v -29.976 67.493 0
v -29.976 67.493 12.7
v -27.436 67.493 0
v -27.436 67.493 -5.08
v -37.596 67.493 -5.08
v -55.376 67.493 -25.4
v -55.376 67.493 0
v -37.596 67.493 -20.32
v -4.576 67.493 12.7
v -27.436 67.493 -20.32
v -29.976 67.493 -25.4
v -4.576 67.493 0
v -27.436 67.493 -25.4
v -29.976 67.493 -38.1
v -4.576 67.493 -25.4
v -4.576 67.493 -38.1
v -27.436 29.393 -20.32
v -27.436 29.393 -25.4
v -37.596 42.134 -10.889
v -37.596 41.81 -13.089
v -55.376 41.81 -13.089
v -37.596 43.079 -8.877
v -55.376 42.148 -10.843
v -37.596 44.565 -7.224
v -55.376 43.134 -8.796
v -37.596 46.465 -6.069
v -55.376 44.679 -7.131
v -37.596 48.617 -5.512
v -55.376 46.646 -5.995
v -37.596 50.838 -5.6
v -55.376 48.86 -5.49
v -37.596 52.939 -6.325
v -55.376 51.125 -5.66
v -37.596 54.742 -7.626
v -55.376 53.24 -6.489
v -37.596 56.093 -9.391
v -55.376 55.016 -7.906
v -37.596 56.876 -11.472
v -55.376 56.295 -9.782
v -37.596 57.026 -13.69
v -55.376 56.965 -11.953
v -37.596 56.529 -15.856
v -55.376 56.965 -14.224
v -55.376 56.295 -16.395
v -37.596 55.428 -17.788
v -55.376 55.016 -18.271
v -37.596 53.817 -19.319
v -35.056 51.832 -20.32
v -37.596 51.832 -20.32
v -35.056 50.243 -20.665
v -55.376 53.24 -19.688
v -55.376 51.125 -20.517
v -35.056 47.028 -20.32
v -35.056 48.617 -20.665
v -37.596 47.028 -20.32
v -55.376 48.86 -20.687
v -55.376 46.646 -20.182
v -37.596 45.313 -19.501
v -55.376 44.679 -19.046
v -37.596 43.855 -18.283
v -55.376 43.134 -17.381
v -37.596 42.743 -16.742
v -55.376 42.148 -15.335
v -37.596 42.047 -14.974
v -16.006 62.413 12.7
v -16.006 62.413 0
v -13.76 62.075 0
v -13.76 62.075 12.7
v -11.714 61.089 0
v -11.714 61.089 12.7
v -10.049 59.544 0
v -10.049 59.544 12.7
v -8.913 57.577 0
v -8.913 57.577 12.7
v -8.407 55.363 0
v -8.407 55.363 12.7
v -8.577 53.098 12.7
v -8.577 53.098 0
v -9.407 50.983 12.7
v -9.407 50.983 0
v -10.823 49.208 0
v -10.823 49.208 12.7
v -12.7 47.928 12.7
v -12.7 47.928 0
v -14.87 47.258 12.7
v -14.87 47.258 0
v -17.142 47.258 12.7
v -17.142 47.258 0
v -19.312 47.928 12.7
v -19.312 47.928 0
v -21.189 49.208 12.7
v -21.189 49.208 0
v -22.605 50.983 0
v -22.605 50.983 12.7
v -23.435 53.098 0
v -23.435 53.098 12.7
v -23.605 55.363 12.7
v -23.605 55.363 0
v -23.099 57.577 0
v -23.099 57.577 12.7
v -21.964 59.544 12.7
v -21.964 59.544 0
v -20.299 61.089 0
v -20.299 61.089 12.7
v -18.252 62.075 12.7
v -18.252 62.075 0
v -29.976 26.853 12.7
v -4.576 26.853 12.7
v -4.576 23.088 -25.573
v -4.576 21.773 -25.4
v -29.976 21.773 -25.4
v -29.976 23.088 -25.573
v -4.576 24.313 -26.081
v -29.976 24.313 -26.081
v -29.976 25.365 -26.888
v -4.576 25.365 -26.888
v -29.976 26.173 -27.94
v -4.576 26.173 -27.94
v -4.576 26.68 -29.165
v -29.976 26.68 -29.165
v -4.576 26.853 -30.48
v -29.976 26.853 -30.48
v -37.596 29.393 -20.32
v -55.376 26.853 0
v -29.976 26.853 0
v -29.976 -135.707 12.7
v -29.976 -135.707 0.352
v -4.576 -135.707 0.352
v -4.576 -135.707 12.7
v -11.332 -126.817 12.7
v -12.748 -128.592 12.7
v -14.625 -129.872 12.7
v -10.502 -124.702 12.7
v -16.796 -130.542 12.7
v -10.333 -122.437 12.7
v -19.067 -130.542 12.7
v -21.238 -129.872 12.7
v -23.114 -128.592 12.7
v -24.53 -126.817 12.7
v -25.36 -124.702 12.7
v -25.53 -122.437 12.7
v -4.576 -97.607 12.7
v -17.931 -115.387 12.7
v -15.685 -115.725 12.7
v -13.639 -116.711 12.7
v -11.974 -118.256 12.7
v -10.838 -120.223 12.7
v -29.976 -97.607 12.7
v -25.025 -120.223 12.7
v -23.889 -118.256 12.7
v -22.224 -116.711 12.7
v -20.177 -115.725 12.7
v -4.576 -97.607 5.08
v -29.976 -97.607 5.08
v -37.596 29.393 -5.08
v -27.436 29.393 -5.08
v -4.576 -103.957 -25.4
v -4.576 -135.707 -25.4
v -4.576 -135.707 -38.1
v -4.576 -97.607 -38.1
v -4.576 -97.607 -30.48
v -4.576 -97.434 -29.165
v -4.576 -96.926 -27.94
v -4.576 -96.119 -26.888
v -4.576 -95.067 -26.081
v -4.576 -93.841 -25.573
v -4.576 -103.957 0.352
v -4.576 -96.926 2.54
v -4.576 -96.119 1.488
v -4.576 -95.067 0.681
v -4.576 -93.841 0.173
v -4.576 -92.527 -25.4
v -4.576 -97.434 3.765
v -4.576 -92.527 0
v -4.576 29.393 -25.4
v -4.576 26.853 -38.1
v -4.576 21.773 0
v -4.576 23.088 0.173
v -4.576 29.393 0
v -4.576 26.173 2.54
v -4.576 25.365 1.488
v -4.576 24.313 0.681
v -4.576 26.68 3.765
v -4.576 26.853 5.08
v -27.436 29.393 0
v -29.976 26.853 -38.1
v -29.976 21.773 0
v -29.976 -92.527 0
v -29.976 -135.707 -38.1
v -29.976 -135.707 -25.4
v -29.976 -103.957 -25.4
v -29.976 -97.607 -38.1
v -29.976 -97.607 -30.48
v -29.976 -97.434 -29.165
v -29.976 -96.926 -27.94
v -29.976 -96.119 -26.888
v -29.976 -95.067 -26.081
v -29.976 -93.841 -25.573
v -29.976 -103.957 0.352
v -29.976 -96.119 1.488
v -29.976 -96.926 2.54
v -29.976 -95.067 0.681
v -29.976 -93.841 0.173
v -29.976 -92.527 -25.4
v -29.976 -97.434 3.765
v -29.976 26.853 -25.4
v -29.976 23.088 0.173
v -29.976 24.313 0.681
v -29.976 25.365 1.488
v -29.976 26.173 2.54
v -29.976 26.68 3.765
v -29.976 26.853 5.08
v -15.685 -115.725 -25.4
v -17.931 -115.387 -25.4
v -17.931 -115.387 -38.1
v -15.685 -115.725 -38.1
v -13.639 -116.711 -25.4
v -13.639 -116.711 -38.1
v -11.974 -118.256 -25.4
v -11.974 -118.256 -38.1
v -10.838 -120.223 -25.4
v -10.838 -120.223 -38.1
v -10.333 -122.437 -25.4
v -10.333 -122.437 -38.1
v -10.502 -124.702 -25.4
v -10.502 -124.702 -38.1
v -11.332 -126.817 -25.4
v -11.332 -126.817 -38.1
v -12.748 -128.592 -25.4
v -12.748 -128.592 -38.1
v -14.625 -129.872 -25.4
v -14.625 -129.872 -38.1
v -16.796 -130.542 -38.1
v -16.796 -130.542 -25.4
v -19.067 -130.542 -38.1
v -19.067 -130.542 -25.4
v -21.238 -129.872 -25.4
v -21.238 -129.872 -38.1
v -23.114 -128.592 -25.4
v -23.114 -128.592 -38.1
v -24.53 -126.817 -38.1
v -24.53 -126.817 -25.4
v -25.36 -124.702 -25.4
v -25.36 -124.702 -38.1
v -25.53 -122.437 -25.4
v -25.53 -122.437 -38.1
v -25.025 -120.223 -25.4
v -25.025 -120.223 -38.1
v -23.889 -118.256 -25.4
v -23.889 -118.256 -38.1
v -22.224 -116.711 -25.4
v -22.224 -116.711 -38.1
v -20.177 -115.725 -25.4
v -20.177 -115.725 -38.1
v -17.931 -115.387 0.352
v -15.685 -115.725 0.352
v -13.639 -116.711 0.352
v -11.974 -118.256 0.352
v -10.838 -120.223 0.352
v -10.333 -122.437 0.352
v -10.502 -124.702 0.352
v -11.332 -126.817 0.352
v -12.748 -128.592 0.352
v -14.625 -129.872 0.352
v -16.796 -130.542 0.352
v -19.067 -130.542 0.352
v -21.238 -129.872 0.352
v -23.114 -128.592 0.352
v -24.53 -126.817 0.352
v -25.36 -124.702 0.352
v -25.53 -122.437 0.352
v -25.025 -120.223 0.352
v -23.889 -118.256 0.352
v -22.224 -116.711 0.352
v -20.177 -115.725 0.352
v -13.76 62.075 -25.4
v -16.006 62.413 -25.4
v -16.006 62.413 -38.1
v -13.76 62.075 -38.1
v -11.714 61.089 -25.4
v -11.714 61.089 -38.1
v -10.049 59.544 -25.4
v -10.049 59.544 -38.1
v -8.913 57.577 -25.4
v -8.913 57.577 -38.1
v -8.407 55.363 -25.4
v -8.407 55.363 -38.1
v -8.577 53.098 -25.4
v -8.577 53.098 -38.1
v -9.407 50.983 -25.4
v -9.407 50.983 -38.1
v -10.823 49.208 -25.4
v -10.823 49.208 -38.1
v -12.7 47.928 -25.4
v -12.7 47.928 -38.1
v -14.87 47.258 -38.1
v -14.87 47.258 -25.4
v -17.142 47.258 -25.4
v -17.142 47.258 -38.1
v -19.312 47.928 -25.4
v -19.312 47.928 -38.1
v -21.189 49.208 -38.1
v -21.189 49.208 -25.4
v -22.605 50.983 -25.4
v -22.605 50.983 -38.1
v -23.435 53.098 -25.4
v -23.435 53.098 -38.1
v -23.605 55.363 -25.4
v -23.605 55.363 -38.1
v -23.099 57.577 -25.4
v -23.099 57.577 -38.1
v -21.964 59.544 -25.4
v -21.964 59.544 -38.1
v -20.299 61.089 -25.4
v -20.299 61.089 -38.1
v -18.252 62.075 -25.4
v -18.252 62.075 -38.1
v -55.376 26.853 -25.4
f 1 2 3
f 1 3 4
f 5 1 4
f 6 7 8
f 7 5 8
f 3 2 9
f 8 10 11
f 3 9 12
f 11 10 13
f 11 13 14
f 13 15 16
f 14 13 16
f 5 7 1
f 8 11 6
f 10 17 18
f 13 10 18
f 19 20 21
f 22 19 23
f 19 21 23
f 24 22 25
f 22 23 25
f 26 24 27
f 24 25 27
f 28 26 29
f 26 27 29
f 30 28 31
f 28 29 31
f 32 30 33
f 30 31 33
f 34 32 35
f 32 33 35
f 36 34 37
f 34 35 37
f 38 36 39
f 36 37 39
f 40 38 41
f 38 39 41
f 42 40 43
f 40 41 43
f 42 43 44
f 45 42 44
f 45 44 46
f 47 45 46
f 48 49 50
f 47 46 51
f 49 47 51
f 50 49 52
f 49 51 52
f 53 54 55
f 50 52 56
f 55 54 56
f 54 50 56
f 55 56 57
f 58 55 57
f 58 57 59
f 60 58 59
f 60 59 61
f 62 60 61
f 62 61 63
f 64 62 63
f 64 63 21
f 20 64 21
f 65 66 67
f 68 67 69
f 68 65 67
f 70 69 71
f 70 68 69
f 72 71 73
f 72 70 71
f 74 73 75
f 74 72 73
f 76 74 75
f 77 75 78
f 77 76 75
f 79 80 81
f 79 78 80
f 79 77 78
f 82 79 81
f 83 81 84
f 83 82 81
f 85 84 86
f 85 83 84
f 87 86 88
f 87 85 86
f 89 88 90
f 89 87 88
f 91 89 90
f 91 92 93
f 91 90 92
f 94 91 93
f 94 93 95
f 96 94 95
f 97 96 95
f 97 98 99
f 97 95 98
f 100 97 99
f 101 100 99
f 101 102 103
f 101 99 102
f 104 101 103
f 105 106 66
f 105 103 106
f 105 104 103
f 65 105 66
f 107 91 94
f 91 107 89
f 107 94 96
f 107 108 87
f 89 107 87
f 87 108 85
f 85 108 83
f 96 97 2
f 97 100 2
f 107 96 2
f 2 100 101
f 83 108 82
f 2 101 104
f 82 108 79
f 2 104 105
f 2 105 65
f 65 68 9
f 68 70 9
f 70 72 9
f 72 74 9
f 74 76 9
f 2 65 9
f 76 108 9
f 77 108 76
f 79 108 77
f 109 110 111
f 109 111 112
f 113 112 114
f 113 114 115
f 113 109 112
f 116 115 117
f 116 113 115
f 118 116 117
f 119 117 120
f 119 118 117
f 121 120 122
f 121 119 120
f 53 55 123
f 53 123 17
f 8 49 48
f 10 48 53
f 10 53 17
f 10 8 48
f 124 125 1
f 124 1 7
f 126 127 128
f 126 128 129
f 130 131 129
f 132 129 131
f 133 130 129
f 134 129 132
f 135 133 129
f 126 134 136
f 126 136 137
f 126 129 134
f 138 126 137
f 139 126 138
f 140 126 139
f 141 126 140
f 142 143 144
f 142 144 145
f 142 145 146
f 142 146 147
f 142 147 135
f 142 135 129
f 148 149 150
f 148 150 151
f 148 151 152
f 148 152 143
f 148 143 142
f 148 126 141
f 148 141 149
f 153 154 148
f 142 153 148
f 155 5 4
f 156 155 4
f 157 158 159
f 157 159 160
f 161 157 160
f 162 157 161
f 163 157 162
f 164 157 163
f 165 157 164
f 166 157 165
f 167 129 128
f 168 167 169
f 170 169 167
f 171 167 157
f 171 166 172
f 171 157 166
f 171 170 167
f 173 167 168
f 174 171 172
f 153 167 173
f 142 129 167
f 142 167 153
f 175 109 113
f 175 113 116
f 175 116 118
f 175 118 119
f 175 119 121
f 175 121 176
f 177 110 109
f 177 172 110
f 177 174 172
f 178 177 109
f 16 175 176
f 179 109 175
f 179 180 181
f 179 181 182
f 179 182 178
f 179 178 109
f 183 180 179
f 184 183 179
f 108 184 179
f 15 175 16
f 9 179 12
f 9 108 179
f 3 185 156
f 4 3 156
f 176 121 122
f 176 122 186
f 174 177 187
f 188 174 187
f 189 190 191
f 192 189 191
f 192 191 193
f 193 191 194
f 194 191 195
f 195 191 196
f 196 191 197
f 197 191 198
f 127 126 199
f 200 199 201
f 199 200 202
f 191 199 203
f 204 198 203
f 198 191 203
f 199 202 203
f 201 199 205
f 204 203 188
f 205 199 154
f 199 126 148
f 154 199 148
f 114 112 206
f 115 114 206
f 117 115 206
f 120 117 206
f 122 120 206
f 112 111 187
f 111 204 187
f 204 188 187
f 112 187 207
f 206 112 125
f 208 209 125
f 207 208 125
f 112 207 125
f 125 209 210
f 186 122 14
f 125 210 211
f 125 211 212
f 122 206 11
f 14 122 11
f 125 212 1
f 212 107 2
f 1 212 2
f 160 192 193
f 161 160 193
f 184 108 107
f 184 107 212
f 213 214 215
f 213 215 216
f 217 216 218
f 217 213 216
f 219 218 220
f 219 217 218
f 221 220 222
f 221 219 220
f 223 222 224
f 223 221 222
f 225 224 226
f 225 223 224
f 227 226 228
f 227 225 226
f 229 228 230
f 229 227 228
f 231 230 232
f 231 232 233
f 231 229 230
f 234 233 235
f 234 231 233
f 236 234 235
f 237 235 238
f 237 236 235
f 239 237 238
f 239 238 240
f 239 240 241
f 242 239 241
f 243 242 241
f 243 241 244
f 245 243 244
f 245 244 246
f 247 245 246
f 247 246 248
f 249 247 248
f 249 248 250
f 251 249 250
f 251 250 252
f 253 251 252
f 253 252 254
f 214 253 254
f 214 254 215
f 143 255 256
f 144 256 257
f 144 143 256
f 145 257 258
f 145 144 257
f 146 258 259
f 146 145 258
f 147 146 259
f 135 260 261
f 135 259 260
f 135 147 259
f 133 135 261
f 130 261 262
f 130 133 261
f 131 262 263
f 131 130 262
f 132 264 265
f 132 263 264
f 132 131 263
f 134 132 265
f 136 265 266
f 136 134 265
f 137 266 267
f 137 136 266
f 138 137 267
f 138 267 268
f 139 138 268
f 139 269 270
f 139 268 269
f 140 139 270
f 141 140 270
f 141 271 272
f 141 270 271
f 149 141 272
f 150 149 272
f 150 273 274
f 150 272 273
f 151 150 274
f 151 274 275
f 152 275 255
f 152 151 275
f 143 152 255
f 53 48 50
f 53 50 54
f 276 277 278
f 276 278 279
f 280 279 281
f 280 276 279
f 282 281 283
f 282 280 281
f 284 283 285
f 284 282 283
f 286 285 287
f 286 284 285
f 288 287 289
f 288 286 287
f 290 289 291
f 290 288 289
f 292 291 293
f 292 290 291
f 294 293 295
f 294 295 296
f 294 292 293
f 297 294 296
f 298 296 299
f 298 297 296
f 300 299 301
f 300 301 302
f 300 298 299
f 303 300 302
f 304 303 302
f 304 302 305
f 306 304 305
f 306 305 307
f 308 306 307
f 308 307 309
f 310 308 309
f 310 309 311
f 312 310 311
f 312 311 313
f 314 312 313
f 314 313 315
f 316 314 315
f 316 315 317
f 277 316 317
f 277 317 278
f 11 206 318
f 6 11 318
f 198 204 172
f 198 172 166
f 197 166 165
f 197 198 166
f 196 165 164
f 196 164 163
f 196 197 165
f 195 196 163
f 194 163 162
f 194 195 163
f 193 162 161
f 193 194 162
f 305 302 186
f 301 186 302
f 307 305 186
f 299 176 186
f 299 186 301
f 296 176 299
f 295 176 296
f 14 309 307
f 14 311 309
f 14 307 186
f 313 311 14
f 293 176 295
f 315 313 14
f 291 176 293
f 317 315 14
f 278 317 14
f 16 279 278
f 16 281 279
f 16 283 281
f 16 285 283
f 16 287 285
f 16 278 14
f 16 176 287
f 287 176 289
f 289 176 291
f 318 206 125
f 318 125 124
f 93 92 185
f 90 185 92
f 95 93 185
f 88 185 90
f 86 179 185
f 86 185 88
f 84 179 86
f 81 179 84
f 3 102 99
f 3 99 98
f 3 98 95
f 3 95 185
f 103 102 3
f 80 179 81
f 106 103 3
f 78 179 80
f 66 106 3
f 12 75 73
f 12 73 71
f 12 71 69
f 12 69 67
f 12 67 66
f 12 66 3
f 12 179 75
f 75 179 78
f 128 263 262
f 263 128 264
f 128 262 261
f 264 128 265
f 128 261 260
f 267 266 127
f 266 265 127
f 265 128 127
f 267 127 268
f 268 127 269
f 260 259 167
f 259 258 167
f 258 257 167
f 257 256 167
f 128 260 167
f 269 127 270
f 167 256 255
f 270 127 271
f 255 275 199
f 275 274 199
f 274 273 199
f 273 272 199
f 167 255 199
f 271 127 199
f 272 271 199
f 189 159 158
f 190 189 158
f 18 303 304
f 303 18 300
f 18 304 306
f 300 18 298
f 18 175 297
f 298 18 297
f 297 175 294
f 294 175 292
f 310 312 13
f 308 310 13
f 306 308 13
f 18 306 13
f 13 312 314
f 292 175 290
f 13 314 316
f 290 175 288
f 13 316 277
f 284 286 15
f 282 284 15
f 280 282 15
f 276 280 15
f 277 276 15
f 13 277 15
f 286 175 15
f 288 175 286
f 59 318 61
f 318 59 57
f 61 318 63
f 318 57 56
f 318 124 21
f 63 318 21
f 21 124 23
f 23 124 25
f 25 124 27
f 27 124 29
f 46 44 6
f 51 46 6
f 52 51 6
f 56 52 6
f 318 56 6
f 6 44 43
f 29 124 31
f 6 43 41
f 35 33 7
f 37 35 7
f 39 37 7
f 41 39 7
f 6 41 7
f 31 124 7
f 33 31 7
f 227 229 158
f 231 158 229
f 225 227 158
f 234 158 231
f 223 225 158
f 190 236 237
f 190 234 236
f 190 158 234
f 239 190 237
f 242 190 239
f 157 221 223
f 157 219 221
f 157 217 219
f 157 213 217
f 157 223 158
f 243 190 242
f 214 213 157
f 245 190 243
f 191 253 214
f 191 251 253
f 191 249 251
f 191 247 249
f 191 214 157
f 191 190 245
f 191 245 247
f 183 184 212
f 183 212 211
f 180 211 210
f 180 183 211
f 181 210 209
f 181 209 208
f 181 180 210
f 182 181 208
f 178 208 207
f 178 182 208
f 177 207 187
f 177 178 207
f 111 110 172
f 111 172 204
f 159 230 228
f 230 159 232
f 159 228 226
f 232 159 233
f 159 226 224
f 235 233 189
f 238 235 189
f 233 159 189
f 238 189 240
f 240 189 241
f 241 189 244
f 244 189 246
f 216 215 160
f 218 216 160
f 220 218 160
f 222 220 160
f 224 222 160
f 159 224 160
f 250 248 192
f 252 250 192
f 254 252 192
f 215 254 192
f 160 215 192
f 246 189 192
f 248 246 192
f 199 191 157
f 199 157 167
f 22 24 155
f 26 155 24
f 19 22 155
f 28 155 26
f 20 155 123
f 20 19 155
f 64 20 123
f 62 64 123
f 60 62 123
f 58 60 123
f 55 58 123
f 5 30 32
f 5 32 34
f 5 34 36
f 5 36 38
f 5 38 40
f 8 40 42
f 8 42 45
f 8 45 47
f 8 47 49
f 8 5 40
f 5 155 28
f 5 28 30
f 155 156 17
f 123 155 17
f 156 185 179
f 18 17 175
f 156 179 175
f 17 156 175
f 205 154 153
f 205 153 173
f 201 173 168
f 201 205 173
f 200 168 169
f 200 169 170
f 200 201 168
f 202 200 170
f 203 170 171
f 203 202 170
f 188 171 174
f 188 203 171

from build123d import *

# Parameters (mm, degrees)
BASE_EXTRUDE_DEPTH  = 25.4
SKETCH7_W           = 12.7
SKETCH7_H           = 38.1
BOSS_EXTRUDE5_DEPTH = 25.4
SKETCH8_W           = 25.751736715
SKETCH8_H           = 31.75
CUT_EXTRUDE5_DEPTH  = 25.4
SKETCH11_W          = 12.7
SKETCH11_H          = 40.64
BOSS_EXTRUDE6_DEPTH = 25.4
SKETCH12_W          = 25.4
SKETCH12_H          = 38.1
CUT_EXTRUDE7_DEPTH  = 22.86
SKETCH13_R          = 7.62
CUT_EXTRUDE8_DEPTH  = 20.32
CUT_EXTRUDE9_START  = -50.8
SKETCH14_R          = 7.62
CUT_EXTRUDE9_DEPTH  = 50.8
CUT_EXTRUDE10_REACH = 216.029
SKETCH15_W          = 20.32
SKETCH15_H          = 15.24
FILLET1_R           = 5.08


with BuildPart() as part:
    # Sketch1 → Base-Extrude (new body)
    with BuildSketch(Plane.XY):
        Polygon((-4.57611336, -135.706612686), (-29.97611336, -135.706612686), (-29.97611336, 26.853387314), (-55.37611336, 26.853387314), (-55.37611336, 67.493387314), (-29.97611336, 67.493387314), (-4.57611336, 67.493387314), align=None)
    extrude(amount=-BASE_EXTRUDE_DEPTH)

    # Sketch7 → Boss-Extrude5 (add)
    with BuildSketch(Plane.ZY.offset(29.97611336)):
        with Locations((-31.75, -116.656612686)):
            Rectangle(SKETCH7_W, SKETCH7_H)
        with Locations((6.35, -116.656612686)):
            Rectangle(SKETCH7_W, SKETCH7_H)
    extrude(amount=-BOSS_EXTRUDE5_DEPTH)

    # Sketch8 → Cut-Extrude5 (cut)
    with BuildSketch(Plane.ZY.offset(29.97611336)):
        with Locations((-12.524131643, -119.831612686)):
            Rectangle(SKETCH8_W, SKETCH8_H)
    extrude(amount=-CUT_EXTRUDE5_DEPTH, mode=Mode.SUBTRACT)

    # Sketch11 → Boss-Extrude6 (add)
    with BuildSketch(Plane(origin=(-4.57611336, 0, 0), x_dir=(0, 0, -1), z_dir=(1, 0, 0))):
        with Locations((31.75, 47.173387314)):
            Rectangle(SKETCH11_W, SKETCH11_H)
        with Locations((-6.35, 47.173387314)):
            Rectangle(SKETCH11_W, SKETCH11_H)
    extrude(amount=-BOSS_EXTRUDE6_DEPTH)

    # Sketch12 → Cut-Extrude7 (cut)
    with BuildSketch(Plane(origin=(-4.57611336, 0, 0), x_dir=(0, 0, -1), z_dir=(1, 0, 0))):
        with Locations((12.7, 48.443387314)):
            Rectangle(SKETCH12_W, SKETCH12_H)
    extrude(amount=-CUT_EXTRUDE7_DEPTH, mode=Mode.SUBTRACT)

    # Sketch13 → Cut-Extrude8 (cut)
    with BuildSketch(Plane.ZY.offset(55.37611336)):
        with Locations(Location((-13.088541232, 49.429752215, 0), (0, 0, 270))):
            Circle(SKETCH13_R)
    extrude(amount=-CUT_EXTRUDE8_DEPTH, mode=Mode.SUBTRACT)

    # Sketch14 → Cut-Extrude9 (cut)
    with BuildSketch(Plane(origin=(0, 0, -38.1), x_dir=(-1, 0, 0), z_dir=(0, 0, -1)).offset(CUT_EXTRUDE9_START)):
        with Locations(Location((16.00611336, 54.793387314, 0), (0, 0, 90))):
            Circle(SKETCH14_R)
        with Locations(Location((17.931310165, -123.006612686, 0), (0, 0, 90))):
            Circle(SKETCH14_R)
    extrude(amount=CUT_EXTRUDE9_DEPTH, mode=Mode.SUBTRACT)

    # Cut-Extrude10: up to this face of the body (flat: up to its plane)
    cut_extrude10_end = Plane(part.part.faces().sort_by_distance((-16.00611336, 29.393387314, -12.7))[0])
    # Sketch15 → Cut-Extrude10 (cut, up to the picked face)
    with BuildSketch(Plane(origin=(0, 67.493387314, 0), x_dir=(1, 0, 0), z_dir=(0, 1, 0)), mode=Mode.PRIVATE) as cut_extrude10_sk1:
        with Locations((-27.43611336, 12.7)):
            Rectangle(SKETCH15_W, SKETCH15_H)
    cut_extrude10_tool1 = split(extrude(cut_extrude10_sk1.sketch, amount=-CUT_EXTRUDE10_REACH, mode=Mode.PRIVATE), bisect_by=cut_extrude10_end, keep=Keep.BOTH, mode=Mode.PRIVATE)
    add(cut_extrude10_tool1.solids().sort_by(Axis((-27.436113, 67.493387, -12.7), (0, -1, 0)))[0], mode=Mode.SUBTRACT)

    # Fillet1
    # the kernel refuses this fillet: 5.08 mm, written as the material it adds along each edge
    with BuildSketch(Plane(origin=(-29.97611336, -97.606612686, 0), x_dir=(0, 1, 0), z_dir=(1, 0, 0)), Plane(origin=(-29.97611336, -97.606612686, -25.4), x_dir=(0, 0, -1), z_dir=(1, 0, 0)), Plane(origin=(-4.57611336, 26.853387314, 0), x_dir=(0, -1, 0), z_dir=(-1, 0, 0))) as fillet1_piece_1:
        with BuildLine():
            CenterArc((FILLET1_R, FILLET1_R), FILLET1_R, 180, 90)
            Line((0, FILLET1_R), (0, 0))
            Line((0, 0), (FILLET1_R, 0))
        make_face()
    extrude(amount=25.4)
    with BuildSketch(Plane(origin=(-4.57611336, 26.853387314, -25.4), x_dir=(0, -1, 0), z_dir=(-1, 0, 0))) as fillet1_piece_2:
        with BuildLine():
            CenterArc((FILLET1_R, -FILLET1_R), FILLET1_R, 90, 90)
            Line((0, -FILLET1_R), (0, 0))
            Line((0, 0), (FILLET1_R, 0))
        make_face()
    extrude(amount=25.4)


solid = part.part
